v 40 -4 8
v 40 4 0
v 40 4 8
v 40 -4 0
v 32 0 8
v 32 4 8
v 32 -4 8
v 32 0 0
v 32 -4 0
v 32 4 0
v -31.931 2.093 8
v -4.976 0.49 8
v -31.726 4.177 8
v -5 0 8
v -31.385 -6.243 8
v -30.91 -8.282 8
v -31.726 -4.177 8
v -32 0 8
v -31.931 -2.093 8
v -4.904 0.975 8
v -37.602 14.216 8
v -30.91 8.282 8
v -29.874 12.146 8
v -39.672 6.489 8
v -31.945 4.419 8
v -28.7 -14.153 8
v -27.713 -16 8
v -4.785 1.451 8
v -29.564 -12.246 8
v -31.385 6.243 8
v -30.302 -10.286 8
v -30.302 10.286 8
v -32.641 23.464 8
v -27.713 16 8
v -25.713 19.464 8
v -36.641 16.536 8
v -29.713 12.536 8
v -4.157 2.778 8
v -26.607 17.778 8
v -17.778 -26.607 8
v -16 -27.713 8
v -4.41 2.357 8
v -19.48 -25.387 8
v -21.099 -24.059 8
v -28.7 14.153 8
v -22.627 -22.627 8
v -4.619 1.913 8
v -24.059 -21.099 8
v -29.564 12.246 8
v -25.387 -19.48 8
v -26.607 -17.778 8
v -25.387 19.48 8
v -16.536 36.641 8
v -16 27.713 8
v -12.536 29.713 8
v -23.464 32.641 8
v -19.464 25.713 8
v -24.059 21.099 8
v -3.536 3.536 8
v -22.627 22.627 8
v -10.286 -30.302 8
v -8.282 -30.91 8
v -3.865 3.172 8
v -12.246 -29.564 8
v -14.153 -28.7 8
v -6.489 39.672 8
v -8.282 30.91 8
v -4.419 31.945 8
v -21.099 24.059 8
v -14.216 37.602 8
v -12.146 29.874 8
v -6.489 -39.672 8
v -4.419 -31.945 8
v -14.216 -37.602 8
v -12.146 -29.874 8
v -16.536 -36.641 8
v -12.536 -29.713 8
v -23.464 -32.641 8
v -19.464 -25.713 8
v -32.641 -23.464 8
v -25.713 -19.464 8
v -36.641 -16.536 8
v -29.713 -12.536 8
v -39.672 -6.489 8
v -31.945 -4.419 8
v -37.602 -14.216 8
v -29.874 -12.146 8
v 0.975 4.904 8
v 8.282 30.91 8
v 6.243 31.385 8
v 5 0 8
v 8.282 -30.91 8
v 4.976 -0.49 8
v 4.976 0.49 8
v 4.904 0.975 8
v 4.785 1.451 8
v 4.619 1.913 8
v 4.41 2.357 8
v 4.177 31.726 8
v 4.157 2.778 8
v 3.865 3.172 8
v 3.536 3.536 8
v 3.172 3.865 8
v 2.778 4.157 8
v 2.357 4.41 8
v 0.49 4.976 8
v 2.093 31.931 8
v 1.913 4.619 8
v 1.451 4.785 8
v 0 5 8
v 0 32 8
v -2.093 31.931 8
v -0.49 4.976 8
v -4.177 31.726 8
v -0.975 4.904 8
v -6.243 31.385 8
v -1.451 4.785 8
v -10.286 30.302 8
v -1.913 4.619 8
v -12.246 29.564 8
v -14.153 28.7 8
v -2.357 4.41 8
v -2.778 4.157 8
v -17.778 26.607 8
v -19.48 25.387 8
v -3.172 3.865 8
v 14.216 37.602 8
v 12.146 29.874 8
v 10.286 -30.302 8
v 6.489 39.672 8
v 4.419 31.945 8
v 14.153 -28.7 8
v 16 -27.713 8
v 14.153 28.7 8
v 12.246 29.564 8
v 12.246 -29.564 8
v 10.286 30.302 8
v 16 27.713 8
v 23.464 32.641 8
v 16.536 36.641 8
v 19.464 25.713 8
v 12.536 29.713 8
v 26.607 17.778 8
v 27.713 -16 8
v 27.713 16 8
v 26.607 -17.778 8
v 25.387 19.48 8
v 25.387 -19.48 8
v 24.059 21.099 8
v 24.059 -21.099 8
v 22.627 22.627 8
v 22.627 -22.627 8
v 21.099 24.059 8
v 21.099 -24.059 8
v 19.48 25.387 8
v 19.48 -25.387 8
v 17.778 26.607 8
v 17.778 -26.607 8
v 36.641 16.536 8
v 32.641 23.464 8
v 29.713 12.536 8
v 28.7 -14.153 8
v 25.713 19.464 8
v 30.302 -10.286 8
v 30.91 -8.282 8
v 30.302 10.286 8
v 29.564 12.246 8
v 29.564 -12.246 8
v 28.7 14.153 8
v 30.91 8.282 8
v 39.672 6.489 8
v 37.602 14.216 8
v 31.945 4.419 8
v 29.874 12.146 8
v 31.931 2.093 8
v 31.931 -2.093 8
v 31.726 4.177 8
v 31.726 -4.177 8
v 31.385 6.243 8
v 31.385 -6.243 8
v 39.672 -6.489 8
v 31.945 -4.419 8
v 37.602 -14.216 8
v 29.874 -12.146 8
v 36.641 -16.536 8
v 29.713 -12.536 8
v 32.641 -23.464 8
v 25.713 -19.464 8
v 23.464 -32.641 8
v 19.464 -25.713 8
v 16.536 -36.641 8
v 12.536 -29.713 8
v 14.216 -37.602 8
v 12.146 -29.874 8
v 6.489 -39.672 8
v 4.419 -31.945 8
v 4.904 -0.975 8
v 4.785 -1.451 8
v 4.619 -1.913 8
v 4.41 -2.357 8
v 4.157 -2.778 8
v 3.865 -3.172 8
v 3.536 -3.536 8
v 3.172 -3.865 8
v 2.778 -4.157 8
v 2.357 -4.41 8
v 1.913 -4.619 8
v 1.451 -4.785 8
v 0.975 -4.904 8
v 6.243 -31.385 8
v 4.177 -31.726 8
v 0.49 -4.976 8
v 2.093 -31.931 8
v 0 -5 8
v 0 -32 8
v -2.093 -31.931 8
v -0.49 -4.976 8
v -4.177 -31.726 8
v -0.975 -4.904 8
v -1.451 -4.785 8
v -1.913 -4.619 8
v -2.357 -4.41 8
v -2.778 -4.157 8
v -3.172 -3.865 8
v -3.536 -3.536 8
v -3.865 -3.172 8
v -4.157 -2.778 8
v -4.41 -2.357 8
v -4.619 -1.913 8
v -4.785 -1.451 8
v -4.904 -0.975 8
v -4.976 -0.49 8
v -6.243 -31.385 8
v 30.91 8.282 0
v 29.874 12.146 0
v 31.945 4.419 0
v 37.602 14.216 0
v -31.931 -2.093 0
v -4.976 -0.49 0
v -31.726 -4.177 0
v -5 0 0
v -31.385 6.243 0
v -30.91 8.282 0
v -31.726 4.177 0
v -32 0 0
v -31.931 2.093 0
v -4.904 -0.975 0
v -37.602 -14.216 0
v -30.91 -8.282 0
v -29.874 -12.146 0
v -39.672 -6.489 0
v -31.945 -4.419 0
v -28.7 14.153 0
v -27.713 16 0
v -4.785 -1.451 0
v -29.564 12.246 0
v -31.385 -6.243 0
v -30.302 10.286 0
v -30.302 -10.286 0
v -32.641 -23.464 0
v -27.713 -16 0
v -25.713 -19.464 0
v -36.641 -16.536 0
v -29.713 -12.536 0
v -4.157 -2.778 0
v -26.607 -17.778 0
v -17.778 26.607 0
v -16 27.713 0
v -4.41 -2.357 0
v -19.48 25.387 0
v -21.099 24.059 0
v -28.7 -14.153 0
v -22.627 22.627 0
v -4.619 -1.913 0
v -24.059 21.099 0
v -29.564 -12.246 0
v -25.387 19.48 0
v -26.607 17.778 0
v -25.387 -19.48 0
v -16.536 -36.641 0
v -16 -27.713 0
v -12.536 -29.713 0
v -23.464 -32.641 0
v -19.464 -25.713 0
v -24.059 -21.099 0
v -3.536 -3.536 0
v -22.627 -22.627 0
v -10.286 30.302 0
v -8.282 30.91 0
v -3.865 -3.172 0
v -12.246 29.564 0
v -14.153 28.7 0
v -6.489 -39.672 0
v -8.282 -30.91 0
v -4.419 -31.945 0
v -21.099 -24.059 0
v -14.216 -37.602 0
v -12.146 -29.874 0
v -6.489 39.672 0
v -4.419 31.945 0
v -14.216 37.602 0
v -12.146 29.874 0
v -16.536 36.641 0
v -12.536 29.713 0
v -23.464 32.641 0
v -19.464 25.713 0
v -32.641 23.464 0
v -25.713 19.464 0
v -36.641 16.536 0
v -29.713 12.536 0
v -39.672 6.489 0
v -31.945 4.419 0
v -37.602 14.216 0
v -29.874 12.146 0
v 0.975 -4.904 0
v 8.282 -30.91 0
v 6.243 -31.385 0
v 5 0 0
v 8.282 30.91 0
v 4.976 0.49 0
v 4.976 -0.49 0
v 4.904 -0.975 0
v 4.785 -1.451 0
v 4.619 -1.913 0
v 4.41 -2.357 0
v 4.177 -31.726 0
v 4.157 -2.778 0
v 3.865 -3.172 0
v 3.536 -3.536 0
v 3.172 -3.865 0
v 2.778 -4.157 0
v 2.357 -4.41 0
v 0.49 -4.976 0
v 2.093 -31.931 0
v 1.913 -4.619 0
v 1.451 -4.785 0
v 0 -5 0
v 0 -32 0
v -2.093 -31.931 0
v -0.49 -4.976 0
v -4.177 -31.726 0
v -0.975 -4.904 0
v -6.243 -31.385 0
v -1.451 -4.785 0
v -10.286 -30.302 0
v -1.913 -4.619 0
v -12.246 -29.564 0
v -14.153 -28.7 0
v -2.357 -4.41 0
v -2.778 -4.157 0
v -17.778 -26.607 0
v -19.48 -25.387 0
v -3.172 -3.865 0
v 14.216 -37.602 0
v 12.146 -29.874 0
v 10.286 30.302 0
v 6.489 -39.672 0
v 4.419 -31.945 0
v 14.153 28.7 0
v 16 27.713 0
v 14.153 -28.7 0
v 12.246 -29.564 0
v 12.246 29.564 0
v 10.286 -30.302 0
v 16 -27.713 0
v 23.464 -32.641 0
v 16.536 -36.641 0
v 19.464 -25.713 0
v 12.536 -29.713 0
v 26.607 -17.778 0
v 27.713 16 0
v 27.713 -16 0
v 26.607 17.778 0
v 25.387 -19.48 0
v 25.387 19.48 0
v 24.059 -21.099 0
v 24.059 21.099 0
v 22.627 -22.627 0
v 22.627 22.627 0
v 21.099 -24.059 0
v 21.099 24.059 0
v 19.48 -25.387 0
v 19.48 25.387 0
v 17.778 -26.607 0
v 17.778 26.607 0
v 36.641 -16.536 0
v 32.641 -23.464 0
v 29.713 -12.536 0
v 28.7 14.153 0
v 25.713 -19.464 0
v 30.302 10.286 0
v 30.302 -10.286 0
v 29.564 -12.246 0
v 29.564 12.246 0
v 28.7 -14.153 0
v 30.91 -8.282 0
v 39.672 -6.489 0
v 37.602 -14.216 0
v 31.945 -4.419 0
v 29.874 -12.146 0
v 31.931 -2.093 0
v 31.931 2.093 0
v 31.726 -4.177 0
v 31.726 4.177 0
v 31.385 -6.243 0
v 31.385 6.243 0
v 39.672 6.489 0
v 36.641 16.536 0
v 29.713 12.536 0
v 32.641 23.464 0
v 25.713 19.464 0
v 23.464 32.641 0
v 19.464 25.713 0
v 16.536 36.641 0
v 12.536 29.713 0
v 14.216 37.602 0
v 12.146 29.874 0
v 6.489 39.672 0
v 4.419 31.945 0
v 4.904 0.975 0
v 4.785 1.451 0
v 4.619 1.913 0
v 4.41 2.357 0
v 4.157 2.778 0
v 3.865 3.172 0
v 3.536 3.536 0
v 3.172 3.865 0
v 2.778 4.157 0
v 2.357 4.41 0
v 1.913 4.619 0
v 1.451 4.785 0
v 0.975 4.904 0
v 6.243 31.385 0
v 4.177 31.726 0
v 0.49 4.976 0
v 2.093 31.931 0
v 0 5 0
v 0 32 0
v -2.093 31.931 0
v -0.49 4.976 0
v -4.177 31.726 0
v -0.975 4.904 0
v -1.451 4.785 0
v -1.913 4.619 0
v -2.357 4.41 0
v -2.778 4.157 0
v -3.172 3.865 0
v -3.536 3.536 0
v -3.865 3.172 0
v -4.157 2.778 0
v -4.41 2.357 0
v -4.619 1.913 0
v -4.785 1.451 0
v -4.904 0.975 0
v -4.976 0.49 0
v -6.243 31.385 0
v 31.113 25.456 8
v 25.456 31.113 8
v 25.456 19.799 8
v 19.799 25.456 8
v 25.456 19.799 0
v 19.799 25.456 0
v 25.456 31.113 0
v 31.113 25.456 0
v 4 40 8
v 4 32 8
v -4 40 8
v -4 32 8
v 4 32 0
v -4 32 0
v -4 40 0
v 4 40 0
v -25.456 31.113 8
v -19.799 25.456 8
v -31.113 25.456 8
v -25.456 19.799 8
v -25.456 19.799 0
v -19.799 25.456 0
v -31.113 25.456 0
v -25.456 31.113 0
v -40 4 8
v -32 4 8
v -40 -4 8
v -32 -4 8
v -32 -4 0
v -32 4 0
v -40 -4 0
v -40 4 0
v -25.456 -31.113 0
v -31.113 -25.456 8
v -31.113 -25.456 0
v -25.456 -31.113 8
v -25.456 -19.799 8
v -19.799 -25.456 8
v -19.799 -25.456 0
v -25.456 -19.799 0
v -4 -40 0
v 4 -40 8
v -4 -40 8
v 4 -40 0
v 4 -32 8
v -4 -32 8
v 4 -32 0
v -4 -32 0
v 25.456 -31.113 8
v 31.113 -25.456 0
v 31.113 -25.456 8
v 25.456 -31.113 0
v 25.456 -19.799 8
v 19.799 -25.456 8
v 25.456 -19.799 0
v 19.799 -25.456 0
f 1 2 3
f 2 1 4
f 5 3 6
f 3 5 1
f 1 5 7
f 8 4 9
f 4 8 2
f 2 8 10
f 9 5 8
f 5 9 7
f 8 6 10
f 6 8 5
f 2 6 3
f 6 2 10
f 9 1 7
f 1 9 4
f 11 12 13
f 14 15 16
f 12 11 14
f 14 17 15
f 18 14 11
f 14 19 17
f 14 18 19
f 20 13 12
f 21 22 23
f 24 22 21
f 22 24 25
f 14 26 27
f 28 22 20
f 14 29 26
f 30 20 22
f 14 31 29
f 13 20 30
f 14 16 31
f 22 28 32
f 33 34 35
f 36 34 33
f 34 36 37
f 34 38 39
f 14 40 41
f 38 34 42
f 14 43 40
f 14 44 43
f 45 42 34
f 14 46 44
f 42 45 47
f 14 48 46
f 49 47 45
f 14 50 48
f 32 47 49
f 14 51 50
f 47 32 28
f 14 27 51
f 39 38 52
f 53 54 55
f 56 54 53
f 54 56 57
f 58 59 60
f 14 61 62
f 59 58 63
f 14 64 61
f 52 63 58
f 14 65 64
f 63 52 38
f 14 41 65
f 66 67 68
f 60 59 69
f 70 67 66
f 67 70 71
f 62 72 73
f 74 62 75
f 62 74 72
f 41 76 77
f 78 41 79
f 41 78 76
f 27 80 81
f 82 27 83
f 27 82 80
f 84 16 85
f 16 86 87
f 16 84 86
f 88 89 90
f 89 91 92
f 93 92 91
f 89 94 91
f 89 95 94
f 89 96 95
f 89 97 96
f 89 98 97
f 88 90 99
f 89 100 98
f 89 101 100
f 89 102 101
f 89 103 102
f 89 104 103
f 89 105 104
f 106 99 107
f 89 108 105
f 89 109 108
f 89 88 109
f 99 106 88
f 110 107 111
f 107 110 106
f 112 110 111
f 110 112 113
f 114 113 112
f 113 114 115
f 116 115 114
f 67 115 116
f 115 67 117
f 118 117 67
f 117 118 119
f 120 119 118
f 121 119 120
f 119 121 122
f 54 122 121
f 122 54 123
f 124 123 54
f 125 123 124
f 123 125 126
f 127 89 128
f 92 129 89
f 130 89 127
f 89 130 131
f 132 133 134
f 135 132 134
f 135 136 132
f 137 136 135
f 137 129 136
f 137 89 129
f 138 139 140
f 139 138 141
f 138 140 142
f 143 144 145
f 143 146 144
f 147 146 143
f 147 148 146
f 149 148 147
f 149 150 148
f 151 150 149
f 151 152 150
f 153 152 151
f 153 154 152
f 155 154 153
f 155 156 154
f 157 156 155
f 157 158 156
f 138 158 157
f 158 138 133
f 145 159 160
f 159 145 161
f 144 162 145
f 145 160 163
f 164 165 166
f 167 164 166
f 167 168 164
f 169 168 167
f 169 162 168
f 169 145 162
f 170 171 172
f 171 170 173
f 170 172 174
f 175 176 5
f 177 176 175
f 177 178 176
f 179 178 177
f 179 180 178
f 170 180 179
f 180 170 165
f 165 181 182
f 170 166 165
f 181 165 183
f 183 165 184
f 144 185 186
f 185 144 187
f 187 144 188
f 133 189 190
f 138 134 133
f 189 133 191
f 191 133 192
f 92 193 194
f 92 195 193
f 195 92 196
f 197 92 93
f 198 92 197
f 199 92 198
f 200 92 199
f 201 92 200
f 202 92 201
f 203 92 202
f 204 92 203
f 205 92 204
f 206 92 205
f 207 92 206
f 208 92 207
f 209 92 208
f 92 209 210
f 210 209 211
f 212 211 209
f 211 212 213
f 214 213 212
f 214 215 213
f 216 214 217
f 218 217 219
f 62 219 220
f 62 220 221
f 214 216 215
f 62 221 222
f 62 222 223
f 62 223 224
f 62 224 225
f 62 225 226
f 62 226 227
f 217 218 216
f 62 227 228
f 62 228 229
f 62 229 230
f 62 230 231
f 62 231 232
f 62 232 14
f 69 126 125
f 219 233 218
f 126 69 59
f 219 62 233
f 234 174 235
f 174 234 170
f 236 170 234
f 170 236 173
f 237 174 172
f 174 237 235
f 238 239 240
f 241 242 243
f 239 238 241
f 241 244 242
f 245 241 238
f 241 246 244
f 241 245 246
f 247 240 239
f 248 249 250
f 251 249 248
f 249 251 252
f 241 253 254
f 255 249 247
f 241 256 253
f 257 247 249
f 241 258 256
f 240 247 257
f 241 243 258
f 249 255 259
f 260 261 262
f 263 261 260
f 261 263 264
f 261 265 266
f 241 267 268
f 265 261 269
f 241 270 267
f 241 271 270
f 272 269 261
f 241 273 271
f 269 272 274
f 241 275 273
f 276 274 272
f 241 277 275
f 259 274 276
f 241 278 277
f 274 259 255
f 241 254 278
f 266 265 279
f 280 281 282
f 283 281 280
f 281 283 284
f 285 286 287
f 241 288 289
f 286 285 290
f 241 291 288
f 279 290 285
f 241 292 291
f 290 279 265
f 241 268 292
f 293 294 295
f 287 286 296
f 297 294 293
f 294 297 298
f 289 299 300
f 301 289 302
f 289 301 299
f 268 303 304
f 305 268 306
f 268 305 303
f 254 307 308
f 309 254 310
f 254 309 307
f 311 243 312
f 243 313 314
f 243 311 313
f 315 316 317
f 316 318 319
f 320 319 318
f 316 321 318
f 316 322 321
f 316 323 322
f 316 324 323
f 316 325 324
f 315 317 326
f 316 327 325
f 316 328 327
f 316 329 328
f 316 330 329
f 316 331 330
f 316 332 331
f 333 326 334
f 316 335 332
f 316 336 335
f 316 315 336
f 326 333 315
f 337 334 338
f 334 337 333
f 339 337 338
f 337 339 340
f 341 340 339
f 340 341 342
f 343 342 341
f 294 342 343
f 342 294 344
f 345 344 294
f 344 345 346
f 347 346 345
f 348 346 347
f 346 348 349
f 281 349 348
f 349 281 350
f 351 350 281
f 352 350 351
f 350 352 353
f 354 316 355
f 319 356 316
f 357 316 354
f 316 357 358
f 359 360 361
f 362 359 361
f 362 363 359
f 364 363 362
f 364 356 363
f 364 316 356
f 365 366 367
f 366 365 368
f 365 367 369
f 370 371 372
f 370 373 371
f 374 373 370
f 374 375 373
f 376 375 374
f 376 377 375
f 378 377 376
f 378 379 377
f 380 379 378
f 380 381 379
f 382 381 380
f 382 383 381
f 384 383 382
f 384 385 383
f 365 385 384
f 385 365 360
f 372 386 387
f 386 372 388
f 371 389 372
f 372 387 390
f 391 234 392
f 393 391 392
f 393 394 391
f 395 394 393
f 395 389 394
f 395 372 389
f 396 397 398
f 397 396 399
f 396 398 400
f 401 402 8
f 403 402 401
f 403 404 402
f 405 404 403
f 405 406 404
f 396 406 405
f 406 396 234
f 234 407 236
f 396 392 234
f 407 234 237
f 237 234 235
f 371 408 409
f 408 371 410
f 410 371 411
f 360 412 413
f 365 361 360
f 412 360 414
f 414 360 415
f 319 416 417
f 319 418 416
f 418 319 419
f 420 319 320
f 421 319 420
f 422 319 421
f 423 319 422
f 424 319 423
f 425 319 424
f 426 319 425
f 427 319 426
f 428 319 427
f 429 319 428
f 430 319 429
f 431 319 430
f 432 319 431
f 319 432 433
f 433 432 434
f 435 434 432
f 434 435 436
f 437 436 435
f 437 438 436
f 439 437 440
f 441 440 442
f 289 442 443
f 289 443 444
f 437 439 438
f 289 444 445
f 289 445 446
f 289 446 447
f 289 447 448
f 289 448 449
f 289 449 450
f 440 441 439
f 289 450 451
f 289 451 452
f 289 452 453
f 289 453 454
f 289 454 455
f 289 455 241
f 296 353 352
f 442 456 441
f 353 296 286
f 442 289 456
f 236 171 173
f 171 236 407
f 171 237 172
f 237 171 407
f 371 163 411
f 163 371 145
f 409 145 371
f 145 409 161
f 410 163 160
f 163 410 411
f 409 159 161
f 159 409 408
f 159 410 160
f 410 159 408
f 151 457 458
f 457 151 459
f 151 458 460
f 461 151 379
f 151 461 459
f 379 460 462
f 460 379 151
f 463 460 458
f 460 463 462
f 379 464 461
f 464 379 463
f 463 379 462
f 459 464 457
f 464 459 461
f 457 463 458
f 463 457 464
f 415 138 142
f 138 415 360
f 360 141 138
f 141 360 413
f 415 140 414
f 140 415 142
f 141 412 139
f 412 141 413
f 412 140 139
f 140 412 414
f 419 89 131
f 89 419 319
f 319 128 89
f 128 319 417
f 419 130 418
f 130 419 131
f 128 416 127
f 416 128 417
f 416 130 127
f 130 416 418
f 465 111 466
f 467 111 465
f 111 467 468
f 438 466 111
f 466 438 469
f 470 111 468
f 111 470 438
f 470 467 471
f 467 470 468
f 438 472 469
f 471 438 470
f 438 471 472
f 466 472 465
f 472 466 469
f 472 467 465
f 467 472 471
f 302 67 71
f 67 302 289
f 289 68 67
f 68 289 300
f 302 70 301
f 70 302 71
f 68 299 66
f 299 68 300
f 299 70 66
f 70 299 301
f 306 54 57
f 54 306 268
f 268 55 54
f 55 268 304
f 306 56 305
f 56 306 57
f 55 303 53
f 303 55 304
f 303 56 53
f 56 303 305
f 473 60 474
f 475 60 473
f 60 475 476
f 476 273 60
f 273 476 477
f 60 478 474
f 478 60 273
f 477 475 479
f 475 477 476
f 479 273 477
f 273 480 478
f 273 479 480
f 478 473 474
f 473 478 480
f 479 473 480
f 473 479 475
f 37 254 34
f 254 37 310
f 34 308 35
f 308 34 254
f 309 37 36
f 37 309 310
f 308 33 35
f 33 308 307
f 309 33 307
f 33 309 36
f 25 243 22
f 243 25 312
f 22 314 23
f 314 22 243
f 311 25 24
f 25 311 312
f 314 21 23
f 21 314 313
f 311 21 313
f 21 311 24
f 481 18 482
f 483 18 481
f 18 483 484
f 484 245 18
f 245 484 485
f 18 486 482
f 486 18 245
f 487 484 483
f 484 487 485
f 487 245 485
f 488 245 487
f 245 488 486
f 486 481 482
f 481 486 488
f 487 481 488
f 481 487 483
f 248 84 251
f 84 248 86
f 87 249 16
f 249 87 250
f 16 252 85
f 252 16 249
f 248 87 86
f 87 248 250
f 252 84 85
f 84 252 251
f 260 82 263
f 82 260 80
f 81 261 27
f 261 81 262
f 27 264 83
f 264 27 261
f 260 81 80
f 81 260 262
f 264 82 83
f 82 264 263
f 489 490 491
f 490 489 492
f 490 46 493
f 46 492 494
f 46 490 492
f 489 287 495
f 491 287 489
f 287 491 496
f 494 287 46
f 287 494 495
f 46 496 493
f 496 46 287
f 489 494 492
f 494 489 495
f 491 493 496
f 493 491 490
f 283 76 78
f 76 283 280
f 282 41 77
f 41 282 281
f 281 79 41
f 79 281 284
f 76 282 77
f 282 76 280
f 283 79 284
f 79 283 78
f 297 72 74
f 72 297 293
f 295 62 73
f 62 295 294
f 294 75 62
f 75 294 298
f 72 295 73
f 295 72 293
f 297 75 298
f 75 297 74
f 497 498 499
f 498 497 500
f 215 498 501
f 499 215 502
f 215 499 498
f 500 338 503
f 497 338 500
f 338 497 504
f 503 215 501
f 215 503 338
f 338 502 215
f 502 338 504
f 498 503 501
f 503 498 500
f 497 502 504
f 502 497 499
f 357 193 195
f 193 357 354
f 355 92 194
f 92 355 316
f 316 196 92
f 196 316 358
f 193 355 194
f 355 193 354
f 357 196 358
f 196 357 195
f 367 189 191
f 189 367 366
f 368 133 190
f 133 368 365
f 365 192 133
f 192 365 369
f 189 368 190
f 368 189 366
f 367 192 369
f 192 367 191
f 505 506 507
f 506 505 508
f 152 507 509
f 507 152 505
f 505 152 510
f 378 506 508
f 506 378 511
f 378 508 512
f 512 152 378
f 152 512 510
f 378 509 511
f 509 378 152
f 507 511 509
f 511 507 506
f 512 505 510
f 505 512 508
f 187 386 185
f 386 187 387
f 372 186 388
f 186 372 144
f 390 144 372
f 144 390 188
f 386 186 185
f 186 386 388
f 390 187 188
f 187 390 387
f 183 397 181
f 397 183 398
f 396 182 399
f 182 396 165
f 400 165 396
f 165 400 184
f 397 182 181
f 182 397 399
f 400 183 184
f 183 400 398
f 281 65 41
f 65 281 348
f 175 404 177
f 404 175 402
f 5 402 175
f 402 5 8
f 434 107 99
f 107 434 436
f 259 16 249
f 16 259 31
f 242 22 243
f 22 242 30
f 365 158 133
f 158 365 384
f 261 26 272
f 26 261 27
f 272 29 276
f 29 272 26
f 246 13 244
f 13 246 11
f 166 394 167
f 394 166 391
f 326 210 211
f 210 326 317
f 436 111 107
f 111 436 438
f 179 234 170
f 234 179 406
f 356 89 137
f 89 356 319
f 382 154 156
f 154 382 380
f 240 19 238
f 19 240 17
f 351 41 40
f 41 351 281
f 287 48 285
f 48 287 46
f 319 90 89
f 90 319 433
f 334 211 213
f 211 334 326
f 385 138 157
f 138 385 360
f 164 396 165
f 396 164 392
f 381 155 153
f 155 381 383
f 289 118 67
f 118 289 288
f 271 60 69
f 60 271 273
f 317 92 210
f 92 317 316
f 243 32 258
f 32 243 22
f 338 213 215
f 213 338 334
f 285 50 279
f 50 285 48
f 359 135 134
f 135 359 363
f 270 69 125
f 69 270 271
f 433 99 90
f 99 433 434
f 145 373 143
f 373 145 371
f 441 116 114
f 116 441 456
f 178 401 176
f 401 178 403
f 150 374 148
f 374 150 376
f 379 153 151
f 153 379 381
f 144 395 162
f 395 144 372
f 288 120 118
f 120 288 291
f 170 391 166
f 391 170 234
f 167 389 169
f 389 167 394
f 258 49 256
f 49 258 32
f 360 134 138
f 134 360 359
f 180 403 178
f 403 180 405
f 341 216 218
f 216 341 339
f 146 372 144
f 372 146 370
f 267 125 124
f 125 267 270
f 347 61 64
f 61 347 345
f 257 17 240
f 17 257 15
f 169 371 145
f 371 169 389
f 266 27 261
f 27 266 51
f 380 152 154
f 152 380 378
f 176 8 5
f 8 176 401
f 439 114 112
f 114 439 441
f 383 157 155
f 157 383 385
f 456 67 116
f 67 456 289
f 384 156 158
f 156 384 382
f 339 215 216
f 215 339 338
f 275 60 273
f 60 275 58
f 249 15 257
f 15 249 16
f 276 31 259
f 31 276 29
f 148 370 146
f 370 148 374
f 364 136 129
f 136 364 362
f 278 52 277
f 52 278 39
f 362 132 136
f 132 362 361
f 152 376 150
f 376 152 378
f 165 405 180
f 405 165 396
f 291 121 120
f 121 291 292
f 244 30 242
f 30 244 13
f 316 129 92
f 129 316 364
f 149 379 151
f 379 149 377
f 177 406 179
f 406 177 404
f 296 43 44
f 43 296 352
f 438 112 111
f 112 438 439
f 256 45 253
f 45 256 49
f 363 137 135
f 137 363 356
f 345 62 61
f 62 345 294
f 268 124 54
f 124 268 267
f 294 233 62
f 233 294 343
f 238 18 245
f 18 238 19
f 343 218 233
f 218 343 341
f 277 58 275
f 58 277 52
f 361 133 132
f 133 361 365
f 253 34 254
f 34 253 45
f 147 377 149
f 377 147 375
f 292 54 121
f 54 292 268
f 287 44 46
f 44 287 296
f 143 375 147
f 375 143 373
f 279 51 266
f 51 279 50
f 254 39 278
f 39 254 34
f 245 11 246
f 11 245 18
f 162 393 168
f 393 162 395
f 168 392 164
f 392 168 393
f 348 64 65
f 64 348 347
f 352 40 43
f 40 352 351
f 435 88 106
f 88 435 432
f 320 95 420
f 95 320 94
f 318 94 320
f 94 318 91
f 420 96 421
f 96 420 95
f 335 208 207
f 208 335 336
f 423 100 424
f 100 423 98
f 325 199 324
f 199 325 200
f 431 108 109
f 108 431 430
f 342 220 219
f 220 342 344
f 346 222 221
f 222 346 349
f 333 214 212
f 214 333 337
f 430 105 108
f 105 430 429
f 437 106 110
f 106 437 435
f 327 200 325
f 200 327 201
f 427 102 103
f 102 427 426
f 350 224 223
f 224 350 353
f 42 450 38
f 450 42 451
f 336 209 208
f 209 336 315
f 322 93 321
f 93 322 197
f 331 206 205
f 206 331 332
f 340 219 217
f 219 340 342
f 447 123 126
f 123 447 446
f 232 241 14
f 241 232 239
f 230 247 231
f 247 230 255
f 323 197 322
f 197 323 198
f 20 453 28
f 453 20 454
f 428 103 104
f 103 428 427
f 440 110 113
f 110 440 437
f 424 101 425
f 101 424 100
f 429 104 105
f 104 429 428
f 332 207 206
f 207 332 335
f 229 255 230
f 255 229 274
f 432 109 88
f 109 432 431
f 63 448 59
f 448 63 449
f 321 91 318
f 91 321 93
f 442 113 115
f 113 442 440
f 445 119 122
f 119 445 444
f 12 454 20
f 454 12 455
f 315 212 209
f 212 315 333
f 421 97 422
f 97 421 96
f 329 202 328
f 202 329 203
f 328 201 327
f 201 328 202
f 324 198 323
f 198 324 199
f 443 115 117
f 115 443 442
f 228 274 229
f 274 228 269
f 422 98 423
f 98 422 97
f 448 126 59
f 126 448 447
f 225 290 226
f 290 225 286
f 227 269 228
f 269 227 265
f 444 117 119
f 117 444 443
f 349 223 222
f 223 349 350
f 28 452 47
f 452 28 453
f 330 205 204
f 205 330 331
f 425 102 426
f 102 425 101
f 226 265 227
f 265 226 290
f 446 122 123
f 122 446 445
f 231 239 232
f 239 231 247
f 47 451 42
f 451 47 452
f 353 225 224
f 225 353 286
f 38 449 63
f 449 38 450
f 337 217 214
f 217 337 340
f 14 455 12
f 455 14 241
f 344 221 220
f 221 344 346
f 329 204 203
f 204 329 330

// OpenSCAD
// Parametric Spur Gear Generator
// Designed for AI-training CAD benchmark tasks

teeth = 24;
outer_radius = 40;
root_radius = 32;
thickness = 8;
bore_diameter = 10;
tooth_depth = outer_radius - root_radius;

module gear_body() {
    cylinder(h = thickness, r = root_radius, $fn = 96);
}

module gear_tooth(angle) {
    rotate([0, 0, angle])
        translate([root_radius, -tooth_depth / 2, 0])
            cube([tooth_depth, tooth_depth, thickness]);
}

module teeth_ring() {
    for (i = [0 : teeth - 1]) {
        gear_tooth(i * 360 / teeth);
    }
}

difference() {
    union() {
        gear_body();
        teeth_ring();
    }

    translate([0, 0, -1])
        cylinder(h = thickness + 2, d = bore_diameter, $fn = 64);
}
